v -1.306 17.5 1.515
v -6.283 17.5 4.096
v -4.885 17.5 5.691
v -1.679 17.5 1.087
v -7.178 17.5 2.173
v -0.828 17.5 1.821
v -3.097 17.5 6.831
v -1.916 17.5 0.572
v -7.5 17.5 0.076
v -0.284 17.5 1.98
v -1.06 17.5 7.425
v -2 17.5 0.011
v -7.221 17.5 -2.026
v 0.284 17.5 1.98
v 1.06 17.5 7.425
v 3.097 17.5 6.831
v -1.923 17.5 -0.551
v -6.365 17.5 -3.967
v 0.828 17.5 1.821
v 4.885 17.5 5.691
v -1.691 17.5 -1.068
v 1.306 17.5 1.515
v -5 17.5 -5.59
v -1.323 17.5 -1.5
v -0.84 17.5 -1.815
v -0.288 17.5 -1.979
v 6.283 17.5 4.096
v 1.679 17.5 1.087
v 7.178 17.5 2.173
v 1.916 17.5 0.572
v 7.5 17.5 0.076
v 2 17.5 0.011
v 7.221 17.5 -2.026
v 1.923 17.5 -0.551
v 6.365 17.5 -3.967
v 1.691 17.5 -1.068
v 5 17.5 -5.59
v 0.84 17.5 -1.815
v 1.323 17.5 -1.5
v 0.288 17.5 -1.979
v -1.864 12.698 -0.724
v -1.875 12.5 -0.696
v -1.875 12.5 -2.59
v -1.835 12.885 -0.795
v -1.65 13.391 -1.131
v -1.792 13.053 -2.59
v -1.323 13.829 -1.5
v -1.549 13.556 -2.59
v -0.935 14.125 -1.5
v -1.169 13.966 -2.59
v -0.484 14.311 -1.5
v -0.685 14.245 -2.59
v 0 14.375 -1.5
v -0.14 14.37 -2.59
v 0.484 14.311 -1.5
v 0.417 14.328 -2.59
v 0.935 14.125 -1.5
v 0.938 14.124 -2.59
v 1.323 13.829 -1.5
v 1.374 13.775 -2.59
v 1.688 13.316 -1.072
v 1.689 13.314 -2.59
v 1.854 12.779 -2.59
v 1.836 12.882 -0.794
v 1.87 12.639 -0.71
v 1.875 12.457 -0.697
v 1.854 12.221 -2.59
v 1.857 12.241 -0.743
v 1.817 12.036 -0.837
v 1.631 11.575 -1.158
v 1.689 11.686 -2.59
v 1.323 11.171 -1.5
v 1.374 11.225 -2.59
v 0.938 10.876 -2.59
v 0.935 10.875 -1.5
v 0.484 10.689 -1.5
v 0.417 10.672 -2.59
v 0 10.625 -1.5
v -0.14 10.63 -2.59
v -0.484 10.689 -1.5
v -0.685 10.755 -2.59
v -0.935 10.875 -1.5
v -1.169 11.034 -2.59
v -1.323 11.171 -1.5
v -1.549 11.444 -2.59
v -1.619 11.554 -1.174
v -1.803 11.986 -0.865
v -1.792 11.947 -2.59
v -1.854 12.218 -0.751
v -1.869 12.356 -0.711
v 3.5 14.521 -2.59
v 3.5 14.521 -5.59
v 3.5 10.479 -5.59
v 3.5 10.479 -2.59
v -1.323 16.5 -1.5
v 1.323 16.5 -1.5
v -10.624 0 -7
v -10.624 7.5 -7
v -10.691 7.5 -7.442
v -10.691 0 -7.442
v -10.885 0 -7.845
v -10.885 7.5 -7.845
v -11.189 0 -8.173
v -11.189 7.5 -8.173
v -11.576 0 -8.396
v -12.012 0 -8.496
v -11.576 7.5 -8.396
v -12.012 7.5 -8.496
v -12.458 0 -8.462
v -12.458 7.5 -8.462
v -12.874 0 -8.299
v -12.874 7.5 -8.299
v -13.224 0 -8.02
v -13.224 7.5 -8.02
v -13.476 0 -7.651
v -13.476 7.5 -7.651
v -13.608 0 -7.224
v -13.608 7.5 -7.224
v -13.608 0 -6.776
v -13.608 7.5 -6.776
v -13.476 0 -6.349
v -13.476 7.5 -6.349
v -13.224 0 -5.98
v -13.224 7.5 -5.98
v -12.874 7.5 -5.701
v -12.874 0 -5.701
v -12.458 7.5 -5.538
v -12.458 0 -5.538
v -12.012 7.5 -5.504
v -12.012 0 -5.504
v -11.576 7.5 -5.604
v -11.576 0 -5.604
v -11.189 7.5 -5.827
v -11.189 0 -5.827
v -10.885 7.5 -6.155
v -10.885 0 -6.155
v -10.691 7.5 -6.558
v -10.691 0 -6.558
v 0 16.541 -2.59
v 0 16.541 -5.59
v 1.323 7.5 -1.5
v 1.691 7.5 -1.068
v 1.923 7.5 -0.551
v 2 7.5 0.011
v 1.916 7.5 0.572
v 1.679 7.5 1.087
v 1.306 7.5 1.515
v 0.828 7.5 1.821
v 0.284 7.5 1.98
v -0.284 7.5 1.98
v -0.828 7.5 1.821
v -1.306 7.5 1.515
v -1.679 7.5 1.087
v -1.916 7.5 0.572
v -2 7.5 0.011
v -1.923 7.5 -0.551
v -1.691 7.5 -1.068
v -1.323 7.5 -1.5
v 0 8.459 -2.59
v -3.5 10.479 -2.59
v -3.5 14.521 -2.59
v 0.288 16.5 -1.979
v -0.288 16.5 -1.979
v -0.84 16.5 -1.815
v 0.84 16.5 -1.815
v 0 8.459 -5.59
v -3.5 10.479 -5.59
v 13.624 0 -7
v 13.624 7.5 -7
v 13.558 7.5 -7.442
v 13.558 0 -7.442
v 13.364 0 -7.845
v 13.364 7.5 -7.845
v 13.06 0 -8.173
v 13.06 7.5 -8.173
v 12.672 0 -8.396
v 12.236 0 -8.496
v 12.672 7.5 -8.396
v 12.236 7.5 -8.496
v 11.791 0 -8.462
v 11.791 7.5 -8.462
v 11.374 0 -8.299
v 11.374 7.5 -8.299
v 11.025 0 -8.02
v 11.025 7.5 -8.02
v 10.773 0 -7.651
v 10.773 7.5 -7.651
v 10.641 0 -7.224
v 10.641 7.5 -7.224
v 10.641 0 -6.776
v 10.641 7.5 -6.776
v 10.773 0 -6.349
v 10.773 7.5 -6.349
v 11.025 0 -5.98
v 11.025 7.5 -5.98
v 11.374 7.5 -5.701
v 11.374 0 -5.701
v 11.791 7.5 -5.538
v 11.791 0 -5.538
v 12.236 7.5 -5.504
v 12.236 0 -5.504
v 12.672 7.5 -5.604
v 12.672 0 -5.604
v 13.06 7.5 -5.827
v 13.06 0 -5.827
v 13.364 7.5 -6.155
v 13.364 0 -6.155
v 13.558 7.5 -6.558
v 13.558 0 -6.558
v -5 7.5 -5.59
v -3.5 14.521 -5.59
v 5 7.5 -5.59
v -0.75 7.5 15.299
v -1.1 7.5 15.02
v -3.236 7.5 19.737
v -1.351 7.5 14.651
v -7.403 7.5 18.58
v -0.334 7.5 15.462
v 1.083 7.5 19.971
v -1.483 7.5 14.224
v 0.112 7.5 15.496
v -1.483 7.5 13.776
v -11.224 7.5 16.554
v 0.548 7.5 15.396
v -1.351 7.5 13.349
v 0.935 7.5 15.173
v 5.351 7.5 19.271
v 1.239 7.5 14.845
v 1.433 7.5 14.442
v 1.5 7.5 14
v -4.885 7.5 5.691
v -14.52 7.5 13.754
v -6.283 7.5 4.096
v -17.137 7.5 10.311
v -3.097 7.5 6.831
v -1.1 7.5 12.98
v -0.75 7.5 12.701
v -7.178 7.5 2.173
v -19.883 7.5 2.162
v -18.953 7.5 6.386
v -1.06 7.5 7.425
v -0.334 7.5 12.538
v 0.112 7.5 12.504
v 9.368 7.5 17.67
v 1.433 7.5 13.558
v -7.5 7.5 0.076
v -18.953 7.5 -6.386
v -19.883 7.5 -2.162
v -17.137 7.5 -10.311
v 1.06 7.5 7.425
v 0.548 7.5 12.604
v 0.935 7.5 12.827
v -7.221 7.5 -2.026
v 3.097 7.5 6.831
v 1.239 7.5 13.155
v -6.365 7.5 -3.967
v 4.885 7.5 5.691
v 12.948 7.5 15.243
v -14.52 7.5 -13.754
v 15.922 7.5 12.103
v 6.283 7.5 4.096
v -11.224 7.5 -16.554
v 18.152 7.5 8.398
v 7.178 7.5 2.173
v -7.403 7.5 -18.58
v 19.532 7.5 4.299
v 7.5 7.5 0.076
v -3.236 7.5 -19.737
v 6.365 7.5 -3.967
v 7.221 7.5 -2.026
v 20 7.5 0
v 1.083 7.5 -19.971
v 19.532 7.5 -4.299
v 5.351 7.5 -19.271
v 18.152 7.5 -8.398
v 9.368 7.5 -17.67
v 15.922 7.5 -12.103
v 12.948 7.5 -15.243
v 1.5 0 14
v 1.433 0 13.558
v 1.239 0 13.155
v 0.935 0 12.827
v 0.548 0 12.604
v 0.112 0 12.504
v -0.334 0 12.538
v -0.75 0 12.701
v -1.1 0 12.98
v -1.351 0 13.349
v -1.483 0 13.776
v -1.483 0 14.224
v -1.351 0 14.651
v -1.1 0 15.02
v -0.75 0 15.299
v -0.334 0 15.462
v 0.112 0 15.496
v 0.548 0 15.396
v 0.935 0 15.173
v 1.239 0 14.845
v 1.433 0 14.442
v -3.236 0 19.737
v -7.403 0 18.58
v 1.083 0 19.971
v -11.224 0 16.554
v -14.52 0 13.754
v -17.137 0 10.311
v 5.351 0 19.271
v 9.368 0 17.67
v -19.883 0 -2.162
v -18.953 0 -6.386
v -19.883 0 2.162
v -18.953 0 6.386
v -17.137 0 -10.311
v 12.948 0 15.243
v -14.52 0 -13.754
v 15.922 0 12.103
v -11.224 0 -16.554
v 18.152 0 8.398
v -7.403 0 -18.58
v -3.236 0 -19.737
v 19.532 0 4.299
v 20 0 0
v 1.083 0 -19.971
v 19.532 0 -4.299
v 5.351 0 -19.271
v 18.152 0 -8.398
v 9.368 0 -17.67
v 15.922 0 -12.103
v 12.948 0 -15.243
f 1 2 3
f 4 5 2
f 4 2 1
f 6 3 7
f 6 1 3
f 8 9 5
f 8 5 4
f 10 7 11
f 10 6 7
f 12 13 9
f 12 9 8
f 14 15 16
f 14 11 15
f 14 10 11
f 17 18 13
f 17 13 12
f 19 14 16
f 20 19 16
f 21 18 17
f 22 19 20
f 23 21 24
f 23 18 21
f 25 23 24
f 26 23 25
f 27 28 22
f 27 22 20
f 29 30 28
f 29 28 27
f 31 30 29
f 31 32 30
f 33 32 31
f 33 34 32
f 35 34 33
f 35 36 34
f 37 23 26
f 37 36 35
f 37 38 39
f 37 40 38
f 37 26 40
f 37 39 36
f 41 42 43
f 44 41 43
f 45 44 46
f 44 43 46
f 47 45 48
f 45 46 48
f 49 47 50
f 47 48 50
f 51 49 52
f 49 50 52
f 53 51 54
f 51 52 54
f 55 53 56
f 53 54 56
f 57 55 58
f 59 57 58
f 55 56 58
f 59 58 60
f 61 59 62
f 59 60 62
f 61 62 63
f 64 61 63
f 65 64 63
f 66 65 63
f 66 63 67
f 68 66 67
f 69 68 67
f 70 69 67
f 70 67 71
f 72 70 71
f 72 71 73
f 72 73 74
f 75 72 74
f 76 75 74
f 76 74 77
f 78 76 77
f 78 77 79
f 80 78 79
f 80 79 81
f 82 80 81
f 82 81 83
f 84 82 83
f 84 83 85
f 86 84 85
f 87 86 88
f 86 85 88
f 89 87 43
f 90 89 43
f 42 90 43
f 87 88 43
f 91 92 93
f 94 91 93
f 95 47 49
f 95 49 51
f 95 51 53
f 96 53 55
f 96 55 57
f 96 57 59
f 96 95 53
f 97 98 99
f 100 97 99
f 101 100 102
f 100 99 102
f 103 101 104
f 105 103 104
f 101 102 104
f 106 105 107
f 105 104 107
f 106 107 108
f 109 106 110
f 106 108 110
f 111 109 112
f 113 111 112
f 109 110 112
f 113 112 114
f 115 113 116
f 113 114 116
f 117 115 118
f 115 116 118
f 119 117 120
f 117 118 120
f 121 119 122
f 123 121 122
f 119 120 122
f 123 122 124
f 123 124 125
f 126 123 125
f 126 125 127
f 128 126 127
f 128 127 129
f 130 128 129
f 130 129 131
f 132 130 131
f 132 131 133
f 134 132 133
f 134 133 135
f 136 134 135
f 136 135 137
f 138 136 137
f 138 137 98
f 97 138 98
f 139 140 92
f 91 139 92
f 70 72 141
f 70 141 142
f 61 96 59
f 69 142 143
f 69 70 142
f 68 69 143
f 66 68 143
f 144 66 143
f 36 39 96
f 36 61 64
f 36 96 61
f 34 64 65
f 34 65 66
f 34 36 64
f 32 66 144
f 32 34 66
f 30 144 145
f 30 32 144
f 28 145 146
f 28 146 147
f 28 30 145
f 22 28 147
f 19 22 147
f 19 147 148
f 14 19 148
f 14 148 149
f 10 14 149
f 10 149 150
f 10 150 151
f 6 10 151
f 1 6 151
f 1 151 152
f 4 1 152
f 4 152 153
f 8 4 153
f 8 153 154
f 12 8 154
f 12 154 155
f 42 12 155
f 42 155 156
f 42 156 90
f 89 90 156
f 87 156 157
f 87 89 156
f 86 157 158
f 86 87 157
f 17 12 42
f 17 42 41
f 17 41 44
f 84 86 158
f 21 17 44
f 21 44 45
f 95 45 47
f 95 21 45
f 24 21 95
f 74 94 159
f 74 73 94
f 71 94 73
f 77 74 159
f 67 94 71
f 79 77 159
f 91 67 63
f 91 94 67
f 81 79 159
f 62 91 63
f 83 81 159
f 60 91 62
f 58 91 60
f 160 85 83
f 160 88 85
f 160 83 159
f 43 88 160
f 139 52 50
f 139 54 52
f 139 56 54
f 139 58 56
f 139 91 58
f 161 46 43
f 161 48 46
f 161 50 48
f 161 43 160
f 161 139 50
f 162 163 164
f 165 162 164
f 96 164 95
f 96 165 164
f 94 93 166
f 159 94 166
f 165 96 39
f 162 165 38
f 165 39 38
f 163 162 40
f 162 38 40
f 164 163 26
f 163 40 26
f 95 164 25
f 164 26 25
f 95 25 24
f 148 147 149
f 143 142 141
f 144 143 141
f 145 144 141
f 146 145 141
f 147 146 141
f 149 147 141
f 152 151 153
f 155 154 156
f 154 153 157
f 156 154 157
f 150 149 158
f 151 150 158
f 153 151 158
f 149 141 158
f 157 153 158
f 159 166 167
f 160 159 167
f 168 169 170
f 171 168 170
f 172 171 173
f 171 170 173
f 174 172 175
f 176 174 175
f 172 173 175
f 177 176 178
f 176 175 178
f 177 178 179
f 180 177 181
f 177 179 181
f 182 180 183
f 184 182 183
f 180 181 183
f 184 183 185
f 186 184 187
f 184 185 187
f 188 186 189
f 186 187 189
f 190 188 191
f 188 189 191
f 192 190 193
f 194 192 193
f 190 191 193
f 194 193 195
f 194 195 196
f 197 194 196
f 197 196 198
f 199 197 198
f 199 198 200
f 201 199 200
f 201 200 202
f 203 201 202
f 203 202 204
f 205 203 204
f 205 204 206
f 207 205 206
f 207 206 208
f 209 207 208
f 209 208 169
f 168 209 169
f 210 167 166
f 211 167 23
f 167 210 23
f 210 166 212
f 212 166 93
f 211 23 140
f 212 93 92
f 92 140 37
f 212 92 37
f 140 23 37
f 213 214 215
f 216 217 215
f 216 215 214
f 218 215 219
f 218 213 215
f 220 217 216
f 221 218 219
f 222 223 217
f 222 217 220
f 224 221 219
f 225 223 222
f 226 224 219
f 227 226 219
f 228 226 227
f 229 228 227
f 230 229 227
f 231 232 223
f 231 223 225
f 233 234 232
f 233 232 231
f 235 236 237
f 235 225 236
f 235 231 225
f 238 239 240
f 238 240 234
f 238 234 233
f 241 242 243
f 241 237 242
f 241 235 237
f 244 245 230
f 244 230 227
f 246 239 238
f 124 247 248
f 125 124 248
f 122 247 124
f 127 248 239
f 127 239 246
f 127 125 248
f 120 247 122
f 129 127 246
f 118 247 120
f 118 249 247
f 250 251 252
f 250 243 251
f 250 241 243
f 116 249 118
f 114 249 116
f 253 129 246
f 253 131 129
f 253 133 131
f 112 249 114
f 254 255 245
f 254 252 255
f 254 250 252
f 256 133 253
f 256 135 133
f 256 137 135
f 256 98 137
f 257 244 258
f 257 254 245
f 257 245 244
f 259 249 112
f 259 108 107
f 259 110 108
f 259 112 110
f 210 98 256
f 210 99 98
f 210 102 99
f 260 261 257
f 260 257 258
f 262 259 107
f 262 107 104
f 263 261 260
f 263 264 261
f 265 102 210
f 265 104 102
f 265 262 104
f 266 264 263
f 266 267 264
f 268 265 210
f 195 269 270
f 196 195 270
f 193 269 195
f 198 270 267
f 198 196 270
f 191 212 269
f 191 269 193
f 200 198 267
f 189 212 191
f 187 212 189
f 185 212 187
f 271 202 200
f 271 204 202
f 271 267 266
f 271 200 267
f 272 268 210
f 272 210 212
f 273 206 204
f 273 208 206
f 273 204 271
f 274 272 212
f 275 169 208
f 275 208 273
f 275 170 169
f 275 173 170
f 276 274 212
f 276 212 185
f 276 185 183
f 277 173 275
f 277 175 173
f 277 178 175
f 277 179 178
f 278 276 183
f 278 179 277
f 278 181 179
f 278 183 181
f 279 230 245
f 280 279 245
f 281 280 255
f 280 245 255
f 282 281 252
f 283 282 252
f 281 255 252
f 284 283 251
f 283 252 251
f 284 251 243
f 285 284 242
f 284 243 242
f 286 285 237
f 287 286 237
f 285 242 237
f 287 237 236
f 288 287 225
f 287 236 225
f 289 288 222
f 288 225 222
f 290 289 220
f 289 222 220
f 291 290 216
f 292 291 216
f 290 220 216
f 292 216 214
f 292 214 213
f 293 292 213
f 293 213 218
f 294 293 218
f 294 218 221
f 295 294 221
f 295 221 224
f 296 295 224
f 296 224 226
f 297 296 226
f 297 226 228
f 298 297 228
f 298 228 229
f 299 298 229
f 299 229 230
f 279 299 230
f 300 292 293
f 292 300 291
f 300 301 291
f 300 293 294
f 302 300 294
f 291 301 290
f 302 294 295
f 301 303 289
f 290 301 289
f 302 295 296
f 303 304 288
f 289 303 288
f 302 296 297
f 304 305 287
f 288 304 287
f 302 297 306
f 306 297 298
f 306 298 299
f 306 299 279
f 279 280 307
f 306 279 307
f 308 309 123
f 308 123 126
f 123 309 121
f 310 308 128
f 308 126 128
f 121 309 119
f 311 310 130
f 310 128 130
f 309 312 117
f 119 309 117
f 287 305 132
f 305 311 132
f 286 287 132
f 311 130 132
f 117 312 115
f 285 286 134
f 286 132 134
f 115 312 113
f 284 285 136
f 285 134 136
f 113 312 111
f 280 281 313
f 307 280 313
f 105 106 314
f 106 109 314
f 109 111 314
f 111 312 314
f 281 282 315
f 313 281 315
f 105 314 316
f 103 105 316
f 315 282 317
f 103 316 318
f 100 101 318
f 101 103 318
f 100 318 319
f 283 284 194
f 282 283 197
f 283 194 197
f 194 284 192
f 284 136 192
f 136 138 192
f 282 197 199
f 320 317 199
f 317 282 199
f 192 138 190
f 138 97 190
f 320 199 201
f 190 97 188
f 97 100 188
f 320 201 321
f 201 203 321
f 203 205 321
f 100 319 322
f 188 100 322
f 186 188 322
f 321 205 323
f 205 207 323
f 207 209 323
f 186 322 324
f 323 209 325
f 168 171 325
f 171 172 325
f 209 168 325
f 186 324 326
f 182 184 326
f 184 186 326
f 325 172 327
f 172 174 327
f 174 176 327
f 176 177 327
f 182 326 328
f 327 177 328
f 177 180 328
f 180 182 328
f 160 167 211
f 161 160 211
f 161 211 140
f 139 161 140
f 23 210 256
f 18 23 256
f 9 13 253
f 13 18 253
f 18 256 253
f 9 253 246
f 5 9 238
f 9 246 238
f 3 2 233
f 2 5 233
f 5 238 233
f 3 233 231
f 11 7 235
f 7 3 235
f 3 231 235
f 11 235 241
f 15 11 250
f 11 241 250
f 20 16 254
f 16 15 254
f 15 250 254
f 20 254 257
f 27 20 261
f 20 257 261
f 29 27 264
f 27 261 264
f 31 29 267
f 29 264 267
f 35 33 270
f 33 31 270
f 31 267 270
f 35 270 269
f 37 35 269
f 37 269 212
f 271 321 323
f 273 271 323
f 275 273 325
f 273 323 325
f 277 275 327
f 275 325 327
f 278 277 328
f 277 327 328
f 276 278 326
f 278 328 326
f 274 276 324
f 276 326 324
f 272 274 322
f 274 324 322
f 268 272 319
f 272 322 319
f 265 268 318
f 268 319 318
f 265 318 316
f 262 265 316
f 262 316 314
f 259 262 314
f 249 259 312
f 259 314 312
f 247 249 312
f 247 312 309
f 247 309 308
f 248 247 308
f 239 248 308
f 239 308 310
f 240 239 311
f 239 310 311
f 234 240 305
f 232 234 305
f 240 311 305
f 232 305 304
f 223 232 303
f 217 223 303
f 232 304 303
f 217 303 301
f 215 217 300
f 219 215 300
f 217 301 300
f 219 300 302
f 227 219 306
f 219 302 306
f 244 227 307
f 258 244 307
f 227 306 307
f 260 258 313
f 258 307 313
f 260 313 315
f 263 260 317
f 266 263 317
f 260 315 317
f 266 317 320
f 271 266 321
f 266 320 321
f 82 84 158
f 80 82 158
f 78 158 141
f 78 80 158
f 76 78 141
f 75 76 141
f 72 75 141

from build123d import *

# Parameters (mm, degrees)
CROQUIS1_R              = 20
SALIENTE_EXTRUIR1_DEPTH = 7.5
CROQUIS2_R              = 7.5
SALIENTE_EXTRUIR2_DEPTH = 10
CORTAR_EXTRUIR1_DEPTH   = 10
CORTAR_EXTRUIR2_DEPTH   = 3
CORTAR_EXTRUIR3_DEPTH   = 10
CROQUIS8_R              = 1.875
CORTAR_EXTRUIR4_DEPTH   = 3
CROQUIS9_R              = 1.5
CORTAR_EXTRUIR5_DEPTH   = 10
CROQUIS10_R             = 2
CORTAR_EXTRUIR7_DEPTH   = 1


with BuildPart() as part:
    # Croquis1 → Saliente-Extruir1 (new body)
    with BuildSketch(Plane(origin=(0, 0, 0), x_dir=(1, 0, 0), z_dir=(0, 1, 0))):
        Circle(CROQUIS1_R)
    extrude(amount=SALIENTE_EXTRUIR1_DEPTH)

    # Croquis2 → Saliente-Extruir2 (add)
    with BuildSketch(Plane(origin=(0, 7.5, 0), x_dir=(1, 0, 0), z_dir=(0, 1, 0))):
        Circle(CROQUIS2_R)
    extrude(amount=SALIENTE_EXTRUIR2_DEPTH)

    # Croquis5 → Cortar-Extruir1 (cut)
    with BuildSketch(Plane(origin=(0, 17.5, 0), x_dir=(1, 0, 0), z_dir=(0, 1, 0))):
        with BuildLine():
            Line((-5, 5.590169944), (5, 5.590169944))
            ThreePointArc((5, 5.590169944), (0, 7.5), (-5, 5.590169944))
        make_face()
    extrude(amount=-CORTAR_EXTRUIR1_DEPTH, mode=Mode.SUBTRACT)

    # Croquis6 → Cortar-Extruir2 (cut)
    with BuildSketch(Plane(origin=(0, 0, -5.590169944), x_dir=(-1, 0, 0), z_dir=(0, 0, -1))):
        Polygon((0, 8.458548116), (3.5, 10.479274058), (3.5, 14.520725942), (0, 16.541451884), (-3.5, 14.520725942), (-3.5, 10.479274058), align=None)
    extrude(amount=-CORTAR_EXTRUIR2_DEPTH, mode=Mode.SUBTRACT)

    # Croquis7 → Cortar-Extruir3 (cut)
    with BuildSketch(Plane(origin=(0, 17.5, 0), x_dir=(1, 0, 0), z_dir=(0, 1, 0))):
        with BuildLine():
            Line((-1.322875656, 1.5), (1.322875656, 1.5))
            ThreePointArc((1.322875656, 1.5), (0, -2), (-1.322875656, 1.5))
        make_face()
    extrude(amount=-CORTAR_EXTRUIR3_DEPTH, mode=Mode.SUBTRACT)

    # Croquis8 → Cortar-Extruir4 (cut)
    with BuildSketch(Plane(origin=(0, 0, -2.590169944), x_dir=(-1, 0, 0), z_dir=(0, 0, -1))):
        with Locations((0, 12.5)):
            Circle(CROQUIS8_R)
    extrude(amount=-CORTAR_EXTRUIR4_DEPTH, mode=Mode.SUBTRACT)

    # Croquis9 → Cortar-Extruir5 (cut)
    with BuildSketch(Plane(origin=(0, 7.5, 0), x_dir=(1, 0, 0), z_dir=(0, 1, 0))):
        with Locations((-12.124355653, 7)):
            Circle(CROQUIS9_R)
        with Locations((12.124355653, 7)):
            Circle(CROQUIS9_R)
        with Locations((0, -14)):
            Circle(CROQUIS9_R)
    extrude(amount=-CORTAR_EXTRUIR5_DEPTH, mode=Mode.SUBTRACT)

    # Croquis10 → Cortar-Extruir7 (cut)
    with BuildSketch(Plane(origin=(0, 17.5, 0), x_dir=(1, 0, 0), z_dir=(0, 1, 0))):
        Circle(CROQUIS10_R)
    extrude(amount=-CORTAR_EXTRUIR7_DEPTH, mode=Mode.SUBTRACT)


solid = part.part
